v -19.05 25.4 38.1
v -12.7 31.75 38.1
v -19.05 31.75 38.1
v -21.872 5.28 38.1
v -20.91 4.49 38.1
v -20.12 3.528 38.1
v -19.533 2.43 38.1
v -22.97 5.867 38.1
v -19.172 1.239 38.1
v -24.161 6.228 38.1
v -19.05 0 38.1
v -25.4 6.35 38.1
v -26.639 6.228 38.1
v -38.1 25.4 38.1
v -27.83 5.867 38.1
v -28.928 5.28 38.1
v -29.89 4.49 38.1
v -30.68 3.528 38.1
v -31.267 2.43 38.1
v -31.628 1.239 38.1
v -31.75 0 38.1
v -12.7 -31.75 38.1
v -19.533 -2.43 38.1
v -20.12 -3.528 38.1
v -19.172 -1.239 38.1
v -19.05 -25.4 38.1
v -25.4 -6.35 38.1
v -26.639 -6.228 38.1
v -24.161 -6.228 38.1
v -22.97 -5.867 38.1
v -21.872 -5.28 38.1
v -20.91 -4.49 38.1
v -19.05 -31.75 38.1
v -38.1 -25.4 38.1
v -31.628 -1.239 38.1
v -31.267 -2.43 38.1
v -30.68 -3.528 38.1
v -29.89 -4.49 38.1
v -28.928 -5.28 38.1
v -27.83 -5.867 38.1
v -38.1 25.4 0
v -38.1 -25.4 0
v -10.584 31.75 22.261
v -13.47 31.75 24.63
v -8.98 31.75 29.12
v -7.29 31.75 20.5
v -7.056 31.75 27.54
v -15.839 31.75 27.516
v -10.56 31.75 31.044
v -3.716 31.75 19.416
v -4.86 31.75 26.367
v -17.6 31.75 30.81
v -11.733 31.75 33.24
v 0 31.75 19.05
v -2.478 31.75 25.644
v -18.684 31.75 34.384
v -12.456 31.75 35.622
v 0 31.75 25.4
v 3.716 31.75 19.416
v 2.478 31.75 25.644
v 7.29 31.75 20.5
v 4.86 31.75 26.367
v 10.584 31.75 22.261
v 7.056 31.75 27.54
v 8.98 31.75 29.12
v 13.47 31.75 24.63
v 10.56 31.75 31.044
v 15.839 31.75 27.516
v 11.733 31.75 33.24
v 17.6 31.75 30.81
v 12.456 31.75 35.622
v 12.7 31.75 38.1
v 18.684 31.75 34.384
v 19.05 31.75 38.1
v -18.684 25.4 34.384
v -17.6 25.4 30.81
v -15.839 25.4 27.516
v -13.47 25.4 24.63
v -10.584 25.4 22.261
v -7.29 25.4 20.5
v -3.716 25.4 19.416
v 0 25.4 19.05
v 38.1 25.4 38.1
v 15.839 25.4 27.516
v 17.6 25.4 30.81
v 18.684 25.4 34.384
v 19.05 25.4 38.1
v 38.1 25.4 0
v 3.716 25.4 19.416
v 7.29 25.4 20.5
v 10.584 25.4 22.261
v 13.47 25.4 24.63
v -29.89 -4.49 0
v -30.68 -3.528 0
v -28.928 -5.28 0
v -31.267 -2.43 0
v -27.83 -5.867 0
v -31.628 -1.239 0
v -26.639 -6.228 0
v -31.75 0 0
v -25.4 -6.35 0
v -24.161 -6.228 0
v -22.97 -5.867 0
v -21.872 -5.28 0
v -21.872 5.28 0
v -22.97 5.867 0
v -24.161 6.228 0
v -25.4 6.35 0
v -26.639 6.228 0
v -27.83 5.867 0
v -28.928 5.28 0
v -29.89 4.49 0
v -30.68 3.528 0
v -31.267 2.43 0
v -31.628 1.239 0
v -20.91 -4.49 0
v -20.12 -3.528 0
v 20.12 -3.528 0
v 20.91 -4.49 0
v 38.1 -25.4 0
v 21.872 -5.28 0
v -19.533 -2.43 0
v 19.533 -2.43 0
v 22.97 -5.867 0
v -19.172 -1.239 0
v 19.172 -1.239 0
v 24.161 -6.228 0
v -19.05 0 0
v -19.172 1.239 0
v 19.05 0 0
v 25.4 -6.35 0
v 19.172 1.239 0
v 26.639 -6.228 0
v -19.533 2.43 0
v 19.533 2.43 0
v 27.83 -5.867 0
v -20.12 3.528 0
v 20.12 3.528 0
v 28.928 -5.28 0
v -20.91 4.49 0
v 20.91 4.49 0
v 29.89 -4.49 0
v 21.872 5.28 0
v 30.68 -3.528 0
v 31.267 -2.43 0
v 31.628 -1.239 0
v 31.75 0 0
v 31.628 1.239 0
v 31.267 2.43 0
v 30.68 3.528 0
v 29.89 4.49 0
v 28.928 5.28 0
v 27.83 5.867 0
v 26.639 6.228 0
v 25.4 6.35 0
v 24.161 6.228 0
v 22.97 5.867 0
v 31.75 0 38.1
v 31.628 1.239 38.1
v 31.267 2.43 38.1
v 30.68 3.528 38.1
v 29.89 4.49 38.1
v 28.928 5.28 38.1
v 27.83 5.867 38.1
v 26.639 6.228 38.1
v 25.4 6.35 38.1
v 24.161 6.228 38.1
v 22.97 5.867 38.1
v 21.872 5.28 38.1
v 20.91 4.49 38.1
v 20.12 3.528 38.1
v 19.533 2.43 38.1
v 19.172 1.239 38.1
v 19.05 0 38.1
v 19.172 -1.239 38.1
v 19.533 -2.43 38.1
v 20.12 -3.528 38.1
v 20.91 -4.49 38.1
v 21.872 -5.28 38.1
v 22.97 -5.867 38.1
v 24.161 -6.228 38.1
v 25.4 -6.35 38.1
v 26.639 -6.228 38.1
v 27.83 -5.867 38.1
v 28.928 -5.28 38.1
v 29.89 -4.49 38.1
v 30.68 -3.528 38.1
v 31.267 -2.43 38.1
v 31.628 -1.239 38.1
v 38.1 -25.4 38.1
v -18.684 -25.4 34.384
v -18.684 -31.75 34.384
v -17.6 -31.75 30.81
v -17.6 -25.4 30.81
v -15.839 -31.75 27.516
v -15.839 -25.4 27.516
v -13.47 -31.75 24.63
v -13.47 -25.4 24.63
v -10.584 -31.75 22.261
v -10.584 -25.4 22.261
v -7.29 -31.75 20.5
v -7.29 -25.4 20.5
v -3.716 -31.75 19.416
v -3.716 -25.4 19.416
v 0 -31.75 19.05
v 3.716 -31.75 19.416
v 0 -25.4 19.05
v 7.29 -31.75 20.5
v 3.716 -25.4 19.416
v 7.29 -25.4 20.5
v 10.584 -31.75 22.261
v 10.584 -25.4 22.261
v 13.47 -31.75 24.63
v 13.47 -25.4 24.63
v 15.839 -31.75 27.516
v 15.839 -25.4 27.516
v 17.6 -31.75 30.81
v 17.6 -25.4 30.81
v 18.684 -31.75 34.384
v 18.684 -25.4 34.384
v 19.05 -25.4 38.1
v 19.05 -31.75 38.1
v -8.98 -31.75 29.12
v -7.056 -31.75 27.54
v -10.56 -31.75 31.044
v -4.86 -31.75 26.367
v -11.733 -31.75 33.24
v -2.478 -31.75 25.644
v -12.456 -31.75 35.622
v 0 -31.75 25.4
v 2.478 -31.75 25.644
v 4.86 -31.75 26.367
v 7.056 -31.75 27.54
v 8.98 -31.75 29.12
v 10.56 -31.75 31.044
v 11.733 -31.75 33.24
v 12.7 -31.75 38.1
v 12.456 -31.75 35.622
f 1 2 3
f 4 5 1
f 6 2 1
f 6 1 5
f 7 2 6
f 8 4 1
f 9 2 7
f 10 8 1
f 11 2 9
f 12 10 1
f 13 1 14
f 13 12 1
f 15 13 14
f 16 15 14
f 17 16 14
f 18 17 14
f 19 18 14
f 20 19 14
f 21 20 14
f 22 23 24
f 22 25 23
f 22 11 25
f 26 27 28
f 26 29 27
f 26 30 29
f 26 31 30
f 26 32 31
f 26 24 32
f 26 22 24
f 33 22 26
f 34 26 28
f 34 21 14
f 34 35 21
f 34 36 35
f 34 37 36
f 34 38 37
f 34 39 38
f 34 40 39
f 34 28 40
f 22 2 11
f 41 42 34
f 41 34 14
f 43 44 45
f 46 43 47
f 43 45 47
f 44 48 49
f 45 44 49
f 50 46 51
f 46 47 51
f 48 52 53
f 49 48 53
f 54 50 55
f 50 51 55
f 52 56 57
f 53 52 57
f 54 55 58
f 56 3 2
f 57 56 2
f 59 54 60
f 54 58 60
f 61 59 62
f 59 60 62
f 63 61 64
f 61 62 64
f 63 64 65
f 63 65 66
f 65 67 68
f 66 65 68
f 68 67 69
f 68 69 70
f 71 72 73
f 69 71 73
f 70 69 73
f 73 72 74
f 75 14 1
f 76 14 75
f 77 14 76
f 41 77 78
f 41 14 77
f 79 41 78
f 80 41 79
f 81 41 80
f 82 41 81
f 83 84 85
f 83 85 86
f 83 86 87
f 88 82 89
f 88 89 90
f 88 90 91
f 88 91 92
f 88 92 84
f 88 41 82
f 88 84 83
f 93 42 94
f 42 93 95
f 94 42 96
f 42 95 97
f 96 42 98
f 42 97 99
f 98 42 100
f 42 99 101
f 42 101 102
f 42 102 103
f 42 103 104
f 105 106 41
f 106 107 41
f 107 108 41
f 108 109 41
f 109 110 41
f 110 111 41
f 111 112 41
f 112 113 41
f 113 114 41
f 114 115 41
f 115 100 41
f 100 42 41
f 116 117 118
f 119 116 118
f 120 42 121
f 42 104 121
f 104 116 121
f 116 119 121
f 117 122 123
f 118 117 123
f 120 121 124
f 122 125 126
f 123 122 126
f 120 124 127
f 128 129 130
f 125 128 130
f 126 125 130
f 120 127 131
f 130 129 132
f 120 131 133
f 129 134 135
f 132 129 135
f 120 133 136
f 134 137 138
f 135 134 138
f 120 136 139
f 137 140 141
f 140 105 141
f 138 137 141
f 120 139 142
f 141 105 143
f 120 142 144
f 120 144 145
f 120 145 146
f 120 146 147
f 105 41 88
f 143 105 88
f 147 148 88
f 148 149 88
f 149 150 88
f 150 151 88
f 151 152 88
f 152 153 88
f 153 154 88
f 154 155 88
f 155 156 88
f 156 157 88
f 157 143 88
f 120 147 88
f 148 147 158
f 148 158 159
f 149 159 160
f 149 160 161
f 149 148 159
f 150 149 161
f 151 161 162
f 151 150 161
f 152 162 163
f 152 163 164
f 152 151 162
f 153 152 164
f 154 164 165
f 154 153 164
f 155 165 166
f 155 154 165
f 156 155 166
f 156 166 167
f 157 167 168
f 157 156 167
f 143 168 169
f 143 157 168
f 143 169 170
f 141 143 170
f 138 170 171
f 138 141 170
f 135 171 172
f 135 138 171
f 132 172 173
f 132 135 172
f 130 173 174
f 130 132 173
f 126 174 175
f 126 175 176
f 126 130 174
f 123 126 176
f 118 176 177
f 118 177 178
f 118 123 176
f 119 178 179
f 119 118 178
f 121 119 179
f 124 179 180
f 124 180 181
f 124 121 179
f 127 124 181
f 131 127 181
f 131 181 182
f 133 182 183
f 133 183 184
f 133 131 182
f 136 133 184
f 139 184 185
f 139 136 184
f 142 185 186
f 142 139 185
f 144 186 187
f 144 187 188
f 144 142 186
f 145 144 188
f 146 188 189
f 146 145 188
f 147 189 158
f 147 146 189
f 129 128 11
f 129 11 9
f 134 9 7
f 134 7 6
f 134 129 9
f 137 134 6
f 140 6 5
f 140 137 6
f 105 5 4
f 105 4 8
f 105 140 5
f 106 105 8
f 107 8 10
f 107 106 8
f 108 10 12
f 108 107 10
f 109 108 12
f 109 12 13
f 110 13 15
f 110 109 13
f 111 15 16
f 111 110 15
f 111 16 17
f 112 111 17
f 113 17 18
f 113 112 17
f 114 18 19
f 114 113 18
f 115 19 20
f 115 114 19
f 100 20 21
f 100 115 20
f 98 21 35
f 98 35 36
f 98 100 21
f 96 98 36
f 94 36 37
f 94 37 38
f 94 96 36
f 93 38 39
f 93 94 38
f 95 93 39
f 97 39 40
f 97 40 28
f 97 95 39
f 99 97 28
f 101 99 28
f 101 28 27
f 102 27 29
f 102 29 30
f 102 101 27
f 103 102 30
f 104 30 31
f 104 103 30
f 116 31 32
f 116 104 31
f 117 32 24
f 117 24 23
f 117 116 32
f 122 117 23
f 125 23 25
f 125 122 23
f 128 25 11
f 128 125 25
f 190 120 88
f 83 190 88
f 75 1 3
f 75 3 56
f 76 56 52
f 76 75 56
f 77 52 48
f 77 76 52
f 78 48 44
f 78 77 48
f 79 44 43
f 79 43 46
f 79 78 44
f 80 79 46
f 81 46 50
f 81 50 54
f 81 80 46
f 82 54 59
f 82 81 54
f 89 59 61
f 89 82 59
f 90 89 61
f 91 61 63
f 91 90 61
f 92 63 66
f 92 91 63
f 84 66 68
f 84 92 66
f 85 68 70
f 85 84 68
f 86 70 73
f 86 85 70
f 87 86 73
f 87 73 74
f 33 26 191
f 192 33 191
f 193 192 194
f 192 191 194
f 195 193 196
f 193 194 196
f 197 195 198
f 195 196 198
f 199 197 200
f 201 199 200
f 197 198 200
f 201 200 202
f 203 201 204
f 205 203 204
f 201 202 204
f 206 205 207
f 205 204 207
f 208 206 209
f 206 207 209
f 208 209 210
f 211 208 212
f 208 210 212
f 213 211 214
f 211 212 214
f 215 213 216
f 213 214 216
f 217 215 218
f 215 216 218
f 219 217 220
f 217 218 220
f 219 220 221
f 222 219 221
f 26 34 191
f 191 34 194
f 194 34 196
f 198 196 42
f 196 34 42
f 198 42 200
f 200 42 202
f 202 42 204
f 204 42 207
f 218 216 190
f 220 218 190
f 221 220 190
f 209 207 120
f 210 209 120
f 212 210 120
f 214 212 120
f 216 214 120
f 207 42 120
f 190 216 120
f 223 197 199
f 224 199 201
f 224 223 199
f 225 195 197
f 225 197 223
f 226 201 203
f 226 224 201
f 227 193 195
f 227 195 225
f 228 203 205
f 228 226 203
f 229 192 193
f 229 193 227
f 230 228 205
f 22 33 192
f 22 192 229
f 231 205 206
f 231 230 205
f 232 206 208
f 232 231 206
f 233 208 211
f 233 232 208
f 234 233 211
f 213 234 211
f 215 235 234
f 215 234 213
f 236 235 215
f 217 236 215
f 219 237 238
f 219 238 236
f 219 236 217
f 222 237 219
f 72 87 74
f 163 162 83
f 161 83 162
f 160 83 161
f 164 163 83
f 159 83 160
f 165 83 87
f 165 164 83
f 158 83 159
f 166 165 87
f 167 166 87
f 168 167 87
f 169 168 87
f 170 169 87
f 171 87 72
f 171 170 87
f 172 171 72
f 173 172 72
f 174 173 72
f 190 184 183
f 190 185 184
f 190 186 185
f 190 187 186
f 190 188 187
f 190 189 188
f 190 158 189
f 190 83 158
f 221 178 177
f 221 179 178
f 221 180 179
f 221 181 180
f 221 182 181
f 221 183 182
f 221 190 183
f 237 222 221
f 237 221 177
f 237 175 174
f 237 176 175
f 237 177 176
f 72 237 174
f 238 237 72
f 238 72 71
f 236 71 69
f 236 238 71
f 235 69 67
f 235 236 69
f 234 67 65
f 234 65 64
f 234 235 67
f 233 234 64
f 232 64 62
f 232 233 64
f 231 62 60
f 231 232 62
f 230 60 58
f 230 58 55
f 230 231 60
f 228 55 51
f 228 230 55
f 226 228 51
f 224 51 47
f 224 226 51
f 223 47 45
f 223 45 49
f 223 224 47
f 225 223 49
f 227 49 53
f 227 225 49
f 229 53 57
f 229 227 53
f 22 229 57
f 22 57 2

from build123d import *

# Parameters (mm, degrees)
F0_W     = 76.2
F0_H     = 50.8
F0_R     = 6.35
F1_DEPTH = 38.1
F3_DEPTH = 50.801
F4_DEPTH = 6.35


with BuildPart() as f1:
    # F0 (on Top) → F1 (new body)
    with BuildSketch(Plane.XY):
        Rectangle(F0_W, F0_H)
        with Locations((-25.4, 0)):
            Circle(F0_R, mode=Mode.SUBTRACT)
        with Locations((25.4, 0)):
            Circle(F0_R, mode=Mode.SUBTRACT)
    extrude(amount=F1_DEPTH)

    # F2 (on face) → F3 (cut, through all)
    with BuildSketch(Plane.XZ.offset(25.4)):
        with BuildLine():
            ThreePointArc((-12.7, 38.1), (0, 25.4), (12.7, 38.1))
            Line((12.7, 38.1), (-12.7, 38.1))
        make_face()
    extrude(amount=-F3_DEPTH, mode=Mode.SUBTRACT)

    # F2 (on face) → F4 (join)
    with BuildSketch(Plane.XZ.offset(25.4)):
        with BuildLine():
            ThreePointArc((-19.05, 38.1), (0, 19.05), (19.05, 38.1))
            Line((19.05, 38.1), (12.7, 38.1))
            ThreePointArc((12.7, 38.1), (0, 25.4), (-12.7, 38.1))
            Line((-12.7, 38.1), (-19.05, 38.1))
        make_face()
    extrude(amount=F4_DEPTH)

    # F5: F1 across plane


with BuildPart() as f1_1:
    add(f1.part)
    add(f1.part.mirror(Plane.XZ))


solid = f1_1.part
